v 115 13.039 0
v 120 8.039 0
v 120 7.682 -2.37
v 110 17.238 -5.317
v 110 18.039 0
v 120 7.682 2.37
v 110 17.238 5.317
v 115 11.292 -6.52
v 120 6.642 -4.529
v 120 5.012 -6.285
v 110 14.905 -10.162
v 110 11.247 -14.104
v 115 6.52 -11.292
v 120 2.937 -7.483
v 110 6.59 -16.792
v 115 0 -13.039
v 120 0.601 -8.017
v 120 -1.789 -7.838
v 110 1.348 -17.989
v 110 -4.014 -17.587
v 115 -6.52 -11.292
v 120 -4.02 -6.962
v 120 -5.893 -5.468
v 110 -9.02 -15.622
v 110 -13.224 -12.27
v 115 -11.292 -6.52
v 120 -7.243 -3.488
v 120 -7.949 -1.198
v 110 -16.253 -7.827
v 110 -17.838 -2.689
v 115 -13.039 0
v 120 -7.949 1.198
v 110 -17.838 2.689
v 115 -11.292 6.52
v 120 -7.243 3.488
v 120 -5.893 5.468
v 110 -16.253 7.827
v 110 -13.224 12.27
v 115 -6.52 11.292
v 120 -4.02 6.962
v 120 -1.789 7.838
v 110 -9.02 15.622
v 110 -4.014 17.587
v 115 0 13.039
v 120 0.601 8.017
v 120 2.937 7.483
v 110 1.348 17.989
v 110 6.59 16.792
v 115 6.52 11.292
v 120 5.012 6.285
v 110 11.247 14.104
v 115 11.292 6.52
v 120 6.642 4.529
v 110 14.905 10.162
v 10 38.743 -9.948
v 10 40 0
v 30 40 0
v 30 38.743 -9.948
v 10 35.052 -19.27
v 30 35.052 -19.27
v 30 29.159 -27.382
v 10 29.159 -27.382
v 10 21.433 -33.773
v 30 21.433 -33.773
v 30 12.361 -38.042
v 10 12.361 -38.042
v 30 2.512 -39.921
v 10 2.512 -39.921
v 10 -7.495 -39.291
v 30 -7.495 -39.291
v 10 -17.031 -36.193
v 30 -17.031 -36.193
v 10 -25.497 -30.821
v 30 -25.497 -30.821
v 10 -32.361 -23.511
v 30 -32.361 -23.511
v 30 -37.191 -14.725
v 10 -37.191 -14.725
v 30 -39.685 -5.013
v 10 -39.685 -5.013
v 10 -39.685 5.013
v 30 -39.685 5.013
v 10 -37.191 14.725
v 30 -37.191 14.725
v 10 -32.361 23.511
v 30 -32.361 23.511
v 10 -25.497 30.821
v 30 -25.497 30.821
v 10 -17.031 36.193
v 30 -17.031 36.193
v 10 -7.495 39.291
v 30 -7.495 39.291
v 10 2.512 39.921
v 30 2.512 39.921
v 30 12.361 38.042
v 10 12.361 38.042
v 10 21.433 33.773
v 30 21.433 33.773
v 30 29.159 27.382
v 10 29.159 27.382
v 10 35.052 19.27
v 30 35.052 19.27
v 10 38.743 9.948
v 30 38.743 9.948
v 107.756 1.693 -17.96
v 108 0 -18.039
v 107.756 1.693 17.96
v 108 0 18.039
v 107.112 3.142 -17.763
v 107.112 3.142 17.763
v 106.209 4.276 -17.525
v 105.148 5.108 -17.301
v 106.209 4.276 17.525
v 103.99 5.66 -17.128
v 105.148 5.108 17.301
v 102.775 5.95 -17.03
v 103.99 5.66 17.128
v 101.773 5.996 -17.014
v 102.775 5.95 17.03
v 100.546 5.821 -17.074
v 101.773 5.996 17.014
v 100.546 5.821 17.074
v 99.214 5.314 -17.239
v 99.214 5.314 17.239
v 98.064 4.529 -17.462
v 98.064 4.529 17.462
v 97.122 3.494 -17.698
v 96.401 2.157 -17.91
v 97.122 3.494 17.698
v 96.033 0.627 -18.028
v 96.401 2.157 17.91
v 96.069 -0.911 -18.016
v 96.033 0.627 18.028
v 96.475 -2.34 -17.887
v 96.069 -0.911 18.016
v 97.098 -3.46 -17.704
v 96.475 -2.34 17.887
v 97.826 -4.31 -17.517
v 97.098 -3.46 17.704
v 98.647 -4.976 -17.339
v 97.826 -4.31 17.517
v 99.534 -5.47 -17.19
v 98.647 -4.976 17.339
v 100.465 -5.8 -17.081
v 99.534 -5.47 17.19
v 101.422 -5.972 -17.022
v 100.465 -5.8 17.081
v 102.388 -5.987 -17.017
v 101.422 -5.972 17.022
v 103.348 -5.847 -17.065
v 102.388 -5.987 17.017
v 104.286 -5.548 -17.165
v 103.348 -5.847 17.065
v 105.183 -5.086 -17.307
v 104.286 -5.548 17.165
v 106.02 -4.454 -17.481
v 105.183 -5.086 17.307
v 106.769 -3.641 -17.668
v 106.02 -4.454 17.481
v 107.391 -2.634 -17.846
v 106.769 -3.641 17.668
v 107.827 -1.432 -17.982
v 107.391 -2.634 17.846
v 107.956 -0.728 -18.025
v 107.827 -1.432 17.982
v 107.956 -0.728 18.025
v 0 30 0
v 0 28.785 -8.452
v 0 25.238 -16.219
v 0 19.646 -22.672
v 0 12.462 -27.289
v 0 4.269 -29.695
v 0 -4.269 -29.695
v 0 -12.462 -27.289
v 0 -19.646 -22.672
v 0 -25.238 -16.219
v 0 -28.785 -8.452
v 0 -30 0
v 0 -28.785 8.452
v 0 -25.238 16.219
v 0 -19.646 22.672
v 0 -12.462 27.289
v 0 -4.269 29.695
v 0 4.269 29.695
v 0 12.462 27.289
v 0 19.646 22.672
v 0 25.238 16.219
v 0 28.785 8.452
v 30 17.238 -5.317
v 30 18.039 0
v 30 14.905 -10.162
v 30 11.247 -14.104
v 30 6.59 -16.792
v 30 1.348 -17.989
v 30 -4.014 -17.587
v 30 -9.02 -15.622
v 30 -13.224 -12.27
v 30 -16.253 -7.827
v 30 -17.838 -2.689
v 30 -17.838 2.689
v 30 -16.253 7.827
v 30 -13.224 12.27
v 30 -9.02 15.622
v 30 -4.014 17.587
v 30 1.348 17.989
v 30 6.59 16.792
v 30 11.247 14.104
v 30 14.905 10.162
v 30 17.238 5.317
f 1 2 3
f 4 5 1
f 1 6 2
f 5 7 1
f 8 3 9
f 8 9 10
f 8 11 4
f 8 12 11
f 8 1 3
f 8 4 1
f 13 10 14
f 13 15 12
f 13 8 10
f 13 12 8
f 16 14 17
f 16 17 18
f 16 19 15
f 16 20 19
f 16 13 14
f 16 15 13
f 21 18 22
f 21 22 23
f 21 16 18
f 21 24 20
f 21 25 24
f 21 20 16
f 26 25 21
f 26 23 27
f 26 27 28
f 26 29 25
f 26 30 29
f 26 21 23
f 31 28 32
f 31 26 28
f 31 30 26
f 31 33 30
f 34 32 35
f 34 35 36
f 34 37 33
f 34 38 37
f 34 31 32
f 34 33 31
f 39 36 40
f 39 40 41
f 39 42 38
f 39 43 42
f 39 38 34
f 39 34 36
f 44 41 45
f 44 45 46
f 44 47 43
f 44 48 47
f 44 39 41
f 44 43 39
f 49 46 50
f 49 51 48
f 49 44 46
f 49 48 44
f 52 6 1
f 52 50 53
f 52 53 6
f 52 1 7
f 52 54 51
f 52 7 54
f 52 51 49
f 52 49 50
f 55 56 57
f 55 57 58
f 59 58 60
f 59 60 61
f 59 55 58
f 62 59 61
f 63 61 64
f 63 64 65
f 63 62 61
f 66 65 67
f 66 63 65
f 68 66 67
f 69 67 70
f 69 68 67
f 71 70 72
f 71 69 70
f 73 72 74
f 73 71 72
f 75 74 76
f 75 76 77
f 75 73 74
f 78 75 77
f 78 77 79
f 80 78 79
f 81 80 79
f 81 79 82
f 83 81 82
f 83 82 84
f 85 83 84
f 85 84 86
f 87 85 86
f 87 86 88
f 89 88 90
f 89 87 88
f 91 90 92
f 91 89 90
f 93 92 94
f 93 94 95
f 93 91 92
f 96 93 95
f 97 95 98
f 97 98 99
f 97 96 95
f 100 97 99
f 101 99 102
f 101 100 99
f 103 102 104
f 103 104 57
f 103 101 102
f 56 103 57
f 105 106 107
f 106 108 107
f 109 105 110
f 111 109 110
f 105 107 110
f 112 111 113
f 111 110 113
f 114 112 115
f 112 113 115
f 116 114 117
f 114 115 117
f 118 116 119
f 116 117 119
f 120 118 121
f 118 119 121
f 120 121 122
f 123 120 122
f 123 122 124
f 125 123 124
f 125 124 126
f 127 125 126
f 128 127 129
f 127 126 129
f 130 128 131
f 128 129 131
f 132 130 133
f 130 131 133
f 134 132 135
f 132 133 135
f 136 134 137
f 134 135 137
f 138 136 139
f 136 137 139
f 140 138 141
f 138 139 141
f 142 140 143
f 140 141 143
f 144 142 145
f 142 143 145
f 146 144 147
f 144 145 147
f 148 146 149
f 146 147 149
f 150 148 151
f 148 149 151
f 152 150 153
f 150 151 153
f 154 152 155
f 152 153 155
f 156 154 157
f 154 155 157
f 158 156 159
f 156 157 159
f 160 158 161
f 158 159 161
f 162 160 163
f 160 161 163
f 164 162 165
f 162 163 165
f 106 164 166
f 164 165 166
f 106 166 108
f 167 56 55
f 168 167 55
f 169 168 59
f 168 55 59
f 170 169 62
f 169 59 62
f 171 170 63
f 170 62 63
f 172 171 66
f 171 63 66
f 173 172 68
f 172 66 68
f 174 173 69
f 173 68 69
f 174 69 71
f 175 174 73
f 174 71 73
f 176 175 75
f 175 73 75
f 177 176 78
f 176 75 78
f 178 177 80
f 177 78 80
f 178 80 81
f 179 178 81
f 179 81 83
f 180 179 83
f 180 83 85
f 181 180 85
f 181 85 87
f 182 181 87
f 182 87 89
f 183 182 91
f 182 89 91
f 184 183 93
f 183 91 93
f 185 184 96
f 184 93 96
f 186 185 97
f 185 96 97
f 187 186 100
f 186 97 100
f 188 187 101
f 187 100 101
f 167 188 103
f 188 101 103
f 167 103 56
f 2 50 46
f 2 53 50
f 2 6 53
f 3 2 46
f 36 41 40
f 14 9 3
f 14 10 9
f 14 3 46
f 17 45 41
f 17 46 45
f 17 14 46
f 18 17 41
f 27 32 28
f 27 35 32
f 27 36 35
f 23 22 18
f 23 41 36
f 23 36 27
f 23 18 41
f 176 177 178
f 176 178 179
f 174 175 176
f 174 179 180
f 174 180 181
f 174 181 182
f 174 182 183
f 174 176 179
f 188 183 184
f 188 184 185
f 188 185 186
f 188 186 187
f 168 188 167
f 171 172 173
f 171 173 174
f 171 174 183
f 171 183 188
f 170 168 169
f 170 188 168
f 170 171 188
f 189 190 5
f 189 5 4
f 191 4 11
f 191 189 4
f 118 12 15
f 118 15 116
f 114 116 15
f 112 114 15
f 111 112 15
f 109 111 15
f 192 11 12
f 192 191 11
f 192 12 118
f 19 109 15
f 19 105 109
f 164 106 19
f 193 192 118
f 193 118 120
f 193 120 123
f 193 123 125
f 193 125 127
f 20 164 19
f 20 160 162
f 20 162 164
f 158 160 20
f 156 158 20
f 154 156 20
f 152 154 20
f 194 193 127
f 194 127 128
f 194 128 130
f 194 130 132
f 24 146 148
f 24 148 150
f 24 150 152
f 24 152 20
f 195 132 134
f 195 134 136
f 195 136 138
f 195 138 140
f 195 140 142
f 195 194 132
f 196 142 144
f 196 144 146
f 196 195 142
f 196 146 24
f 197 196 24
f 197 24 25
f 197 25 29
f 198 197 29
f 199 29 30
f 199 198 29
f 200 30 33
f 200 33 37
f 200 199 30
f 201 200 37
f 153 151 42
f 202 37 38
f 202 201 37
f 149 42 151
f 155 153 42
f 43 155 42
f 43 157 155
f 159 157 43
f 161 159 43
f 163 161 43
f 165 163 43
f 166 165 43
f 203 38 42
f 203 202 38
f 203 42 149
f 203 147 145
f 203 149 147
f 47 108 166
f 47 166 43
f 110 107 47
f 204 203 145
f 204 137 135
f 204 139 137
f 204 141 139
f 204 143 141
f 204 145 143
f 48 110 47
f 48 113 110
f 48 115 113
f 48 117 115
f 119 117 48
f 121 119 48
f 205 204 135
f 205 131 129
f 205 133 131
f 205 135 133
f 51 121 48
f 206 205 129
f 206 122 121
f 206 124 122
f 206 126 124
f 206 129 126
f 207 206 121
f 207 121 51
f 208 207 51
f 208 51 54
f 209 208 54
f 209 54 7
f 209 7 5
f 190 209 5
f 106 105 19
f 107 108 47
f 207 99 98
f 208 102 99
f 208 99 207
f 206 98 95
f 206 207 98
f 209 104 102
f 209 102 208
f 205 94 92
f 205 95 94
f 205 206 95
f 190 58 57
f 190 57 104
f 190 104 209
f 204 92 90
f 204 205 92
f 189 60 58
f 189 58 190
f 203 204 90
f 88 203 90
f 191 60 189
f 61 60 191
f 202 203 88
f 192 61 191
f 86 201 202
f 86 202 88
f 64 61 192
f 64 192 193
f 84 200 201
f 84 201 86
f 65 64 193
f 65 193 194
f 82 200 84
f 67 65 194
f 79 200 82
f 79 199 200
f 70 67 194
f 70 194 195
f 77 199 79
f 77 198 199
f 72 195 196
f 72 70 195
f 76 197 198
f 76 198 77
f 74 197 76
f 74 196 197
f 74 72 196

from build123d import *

# Parameters (mm, degrees)
F2_SIZE2      = 10
F2_SIZE       = 10
F3_R          = 6
F4_DEPTH      = 40.001
F4_DEPTH_BACK = 40.001


with BuildPart() as f1:
    # F0 (on Top) → F1 (revolve)
    with BuildSketch(Plane.XY):
        Polygon((0, 40), (0, 0), (120, 0), (120, 18.0392161204), (30, 18.0392161204), (30, 40), align=None)
    revolve(axis=Axis((60, 0, 0), (-1, 0, 0)))

    # F2
    f2_edges = [f1.edges().sort_by_distance(p)[0] for p in [
        (0, -40, 0),
        (120, -18.039216, 0),
    ]]
    chamfer(f2_edges, length=F2_SIZE, length2=F2_SIZE2)

    # F3 (on Top) → F4 (cut, two sides)
    with BuildSketch(Plane.XY) as f4_sk:
        with Locations((102, 0)):
            Circle(F3_R)
    extrude(amount=-F4_DEPTH, mode=Mode.SUBTRACT)
    extrude(f4_sk.sketch, amount=F4_DEPTH_BACK, mode=Mode.SUBTRACT)


solid = f1.part
